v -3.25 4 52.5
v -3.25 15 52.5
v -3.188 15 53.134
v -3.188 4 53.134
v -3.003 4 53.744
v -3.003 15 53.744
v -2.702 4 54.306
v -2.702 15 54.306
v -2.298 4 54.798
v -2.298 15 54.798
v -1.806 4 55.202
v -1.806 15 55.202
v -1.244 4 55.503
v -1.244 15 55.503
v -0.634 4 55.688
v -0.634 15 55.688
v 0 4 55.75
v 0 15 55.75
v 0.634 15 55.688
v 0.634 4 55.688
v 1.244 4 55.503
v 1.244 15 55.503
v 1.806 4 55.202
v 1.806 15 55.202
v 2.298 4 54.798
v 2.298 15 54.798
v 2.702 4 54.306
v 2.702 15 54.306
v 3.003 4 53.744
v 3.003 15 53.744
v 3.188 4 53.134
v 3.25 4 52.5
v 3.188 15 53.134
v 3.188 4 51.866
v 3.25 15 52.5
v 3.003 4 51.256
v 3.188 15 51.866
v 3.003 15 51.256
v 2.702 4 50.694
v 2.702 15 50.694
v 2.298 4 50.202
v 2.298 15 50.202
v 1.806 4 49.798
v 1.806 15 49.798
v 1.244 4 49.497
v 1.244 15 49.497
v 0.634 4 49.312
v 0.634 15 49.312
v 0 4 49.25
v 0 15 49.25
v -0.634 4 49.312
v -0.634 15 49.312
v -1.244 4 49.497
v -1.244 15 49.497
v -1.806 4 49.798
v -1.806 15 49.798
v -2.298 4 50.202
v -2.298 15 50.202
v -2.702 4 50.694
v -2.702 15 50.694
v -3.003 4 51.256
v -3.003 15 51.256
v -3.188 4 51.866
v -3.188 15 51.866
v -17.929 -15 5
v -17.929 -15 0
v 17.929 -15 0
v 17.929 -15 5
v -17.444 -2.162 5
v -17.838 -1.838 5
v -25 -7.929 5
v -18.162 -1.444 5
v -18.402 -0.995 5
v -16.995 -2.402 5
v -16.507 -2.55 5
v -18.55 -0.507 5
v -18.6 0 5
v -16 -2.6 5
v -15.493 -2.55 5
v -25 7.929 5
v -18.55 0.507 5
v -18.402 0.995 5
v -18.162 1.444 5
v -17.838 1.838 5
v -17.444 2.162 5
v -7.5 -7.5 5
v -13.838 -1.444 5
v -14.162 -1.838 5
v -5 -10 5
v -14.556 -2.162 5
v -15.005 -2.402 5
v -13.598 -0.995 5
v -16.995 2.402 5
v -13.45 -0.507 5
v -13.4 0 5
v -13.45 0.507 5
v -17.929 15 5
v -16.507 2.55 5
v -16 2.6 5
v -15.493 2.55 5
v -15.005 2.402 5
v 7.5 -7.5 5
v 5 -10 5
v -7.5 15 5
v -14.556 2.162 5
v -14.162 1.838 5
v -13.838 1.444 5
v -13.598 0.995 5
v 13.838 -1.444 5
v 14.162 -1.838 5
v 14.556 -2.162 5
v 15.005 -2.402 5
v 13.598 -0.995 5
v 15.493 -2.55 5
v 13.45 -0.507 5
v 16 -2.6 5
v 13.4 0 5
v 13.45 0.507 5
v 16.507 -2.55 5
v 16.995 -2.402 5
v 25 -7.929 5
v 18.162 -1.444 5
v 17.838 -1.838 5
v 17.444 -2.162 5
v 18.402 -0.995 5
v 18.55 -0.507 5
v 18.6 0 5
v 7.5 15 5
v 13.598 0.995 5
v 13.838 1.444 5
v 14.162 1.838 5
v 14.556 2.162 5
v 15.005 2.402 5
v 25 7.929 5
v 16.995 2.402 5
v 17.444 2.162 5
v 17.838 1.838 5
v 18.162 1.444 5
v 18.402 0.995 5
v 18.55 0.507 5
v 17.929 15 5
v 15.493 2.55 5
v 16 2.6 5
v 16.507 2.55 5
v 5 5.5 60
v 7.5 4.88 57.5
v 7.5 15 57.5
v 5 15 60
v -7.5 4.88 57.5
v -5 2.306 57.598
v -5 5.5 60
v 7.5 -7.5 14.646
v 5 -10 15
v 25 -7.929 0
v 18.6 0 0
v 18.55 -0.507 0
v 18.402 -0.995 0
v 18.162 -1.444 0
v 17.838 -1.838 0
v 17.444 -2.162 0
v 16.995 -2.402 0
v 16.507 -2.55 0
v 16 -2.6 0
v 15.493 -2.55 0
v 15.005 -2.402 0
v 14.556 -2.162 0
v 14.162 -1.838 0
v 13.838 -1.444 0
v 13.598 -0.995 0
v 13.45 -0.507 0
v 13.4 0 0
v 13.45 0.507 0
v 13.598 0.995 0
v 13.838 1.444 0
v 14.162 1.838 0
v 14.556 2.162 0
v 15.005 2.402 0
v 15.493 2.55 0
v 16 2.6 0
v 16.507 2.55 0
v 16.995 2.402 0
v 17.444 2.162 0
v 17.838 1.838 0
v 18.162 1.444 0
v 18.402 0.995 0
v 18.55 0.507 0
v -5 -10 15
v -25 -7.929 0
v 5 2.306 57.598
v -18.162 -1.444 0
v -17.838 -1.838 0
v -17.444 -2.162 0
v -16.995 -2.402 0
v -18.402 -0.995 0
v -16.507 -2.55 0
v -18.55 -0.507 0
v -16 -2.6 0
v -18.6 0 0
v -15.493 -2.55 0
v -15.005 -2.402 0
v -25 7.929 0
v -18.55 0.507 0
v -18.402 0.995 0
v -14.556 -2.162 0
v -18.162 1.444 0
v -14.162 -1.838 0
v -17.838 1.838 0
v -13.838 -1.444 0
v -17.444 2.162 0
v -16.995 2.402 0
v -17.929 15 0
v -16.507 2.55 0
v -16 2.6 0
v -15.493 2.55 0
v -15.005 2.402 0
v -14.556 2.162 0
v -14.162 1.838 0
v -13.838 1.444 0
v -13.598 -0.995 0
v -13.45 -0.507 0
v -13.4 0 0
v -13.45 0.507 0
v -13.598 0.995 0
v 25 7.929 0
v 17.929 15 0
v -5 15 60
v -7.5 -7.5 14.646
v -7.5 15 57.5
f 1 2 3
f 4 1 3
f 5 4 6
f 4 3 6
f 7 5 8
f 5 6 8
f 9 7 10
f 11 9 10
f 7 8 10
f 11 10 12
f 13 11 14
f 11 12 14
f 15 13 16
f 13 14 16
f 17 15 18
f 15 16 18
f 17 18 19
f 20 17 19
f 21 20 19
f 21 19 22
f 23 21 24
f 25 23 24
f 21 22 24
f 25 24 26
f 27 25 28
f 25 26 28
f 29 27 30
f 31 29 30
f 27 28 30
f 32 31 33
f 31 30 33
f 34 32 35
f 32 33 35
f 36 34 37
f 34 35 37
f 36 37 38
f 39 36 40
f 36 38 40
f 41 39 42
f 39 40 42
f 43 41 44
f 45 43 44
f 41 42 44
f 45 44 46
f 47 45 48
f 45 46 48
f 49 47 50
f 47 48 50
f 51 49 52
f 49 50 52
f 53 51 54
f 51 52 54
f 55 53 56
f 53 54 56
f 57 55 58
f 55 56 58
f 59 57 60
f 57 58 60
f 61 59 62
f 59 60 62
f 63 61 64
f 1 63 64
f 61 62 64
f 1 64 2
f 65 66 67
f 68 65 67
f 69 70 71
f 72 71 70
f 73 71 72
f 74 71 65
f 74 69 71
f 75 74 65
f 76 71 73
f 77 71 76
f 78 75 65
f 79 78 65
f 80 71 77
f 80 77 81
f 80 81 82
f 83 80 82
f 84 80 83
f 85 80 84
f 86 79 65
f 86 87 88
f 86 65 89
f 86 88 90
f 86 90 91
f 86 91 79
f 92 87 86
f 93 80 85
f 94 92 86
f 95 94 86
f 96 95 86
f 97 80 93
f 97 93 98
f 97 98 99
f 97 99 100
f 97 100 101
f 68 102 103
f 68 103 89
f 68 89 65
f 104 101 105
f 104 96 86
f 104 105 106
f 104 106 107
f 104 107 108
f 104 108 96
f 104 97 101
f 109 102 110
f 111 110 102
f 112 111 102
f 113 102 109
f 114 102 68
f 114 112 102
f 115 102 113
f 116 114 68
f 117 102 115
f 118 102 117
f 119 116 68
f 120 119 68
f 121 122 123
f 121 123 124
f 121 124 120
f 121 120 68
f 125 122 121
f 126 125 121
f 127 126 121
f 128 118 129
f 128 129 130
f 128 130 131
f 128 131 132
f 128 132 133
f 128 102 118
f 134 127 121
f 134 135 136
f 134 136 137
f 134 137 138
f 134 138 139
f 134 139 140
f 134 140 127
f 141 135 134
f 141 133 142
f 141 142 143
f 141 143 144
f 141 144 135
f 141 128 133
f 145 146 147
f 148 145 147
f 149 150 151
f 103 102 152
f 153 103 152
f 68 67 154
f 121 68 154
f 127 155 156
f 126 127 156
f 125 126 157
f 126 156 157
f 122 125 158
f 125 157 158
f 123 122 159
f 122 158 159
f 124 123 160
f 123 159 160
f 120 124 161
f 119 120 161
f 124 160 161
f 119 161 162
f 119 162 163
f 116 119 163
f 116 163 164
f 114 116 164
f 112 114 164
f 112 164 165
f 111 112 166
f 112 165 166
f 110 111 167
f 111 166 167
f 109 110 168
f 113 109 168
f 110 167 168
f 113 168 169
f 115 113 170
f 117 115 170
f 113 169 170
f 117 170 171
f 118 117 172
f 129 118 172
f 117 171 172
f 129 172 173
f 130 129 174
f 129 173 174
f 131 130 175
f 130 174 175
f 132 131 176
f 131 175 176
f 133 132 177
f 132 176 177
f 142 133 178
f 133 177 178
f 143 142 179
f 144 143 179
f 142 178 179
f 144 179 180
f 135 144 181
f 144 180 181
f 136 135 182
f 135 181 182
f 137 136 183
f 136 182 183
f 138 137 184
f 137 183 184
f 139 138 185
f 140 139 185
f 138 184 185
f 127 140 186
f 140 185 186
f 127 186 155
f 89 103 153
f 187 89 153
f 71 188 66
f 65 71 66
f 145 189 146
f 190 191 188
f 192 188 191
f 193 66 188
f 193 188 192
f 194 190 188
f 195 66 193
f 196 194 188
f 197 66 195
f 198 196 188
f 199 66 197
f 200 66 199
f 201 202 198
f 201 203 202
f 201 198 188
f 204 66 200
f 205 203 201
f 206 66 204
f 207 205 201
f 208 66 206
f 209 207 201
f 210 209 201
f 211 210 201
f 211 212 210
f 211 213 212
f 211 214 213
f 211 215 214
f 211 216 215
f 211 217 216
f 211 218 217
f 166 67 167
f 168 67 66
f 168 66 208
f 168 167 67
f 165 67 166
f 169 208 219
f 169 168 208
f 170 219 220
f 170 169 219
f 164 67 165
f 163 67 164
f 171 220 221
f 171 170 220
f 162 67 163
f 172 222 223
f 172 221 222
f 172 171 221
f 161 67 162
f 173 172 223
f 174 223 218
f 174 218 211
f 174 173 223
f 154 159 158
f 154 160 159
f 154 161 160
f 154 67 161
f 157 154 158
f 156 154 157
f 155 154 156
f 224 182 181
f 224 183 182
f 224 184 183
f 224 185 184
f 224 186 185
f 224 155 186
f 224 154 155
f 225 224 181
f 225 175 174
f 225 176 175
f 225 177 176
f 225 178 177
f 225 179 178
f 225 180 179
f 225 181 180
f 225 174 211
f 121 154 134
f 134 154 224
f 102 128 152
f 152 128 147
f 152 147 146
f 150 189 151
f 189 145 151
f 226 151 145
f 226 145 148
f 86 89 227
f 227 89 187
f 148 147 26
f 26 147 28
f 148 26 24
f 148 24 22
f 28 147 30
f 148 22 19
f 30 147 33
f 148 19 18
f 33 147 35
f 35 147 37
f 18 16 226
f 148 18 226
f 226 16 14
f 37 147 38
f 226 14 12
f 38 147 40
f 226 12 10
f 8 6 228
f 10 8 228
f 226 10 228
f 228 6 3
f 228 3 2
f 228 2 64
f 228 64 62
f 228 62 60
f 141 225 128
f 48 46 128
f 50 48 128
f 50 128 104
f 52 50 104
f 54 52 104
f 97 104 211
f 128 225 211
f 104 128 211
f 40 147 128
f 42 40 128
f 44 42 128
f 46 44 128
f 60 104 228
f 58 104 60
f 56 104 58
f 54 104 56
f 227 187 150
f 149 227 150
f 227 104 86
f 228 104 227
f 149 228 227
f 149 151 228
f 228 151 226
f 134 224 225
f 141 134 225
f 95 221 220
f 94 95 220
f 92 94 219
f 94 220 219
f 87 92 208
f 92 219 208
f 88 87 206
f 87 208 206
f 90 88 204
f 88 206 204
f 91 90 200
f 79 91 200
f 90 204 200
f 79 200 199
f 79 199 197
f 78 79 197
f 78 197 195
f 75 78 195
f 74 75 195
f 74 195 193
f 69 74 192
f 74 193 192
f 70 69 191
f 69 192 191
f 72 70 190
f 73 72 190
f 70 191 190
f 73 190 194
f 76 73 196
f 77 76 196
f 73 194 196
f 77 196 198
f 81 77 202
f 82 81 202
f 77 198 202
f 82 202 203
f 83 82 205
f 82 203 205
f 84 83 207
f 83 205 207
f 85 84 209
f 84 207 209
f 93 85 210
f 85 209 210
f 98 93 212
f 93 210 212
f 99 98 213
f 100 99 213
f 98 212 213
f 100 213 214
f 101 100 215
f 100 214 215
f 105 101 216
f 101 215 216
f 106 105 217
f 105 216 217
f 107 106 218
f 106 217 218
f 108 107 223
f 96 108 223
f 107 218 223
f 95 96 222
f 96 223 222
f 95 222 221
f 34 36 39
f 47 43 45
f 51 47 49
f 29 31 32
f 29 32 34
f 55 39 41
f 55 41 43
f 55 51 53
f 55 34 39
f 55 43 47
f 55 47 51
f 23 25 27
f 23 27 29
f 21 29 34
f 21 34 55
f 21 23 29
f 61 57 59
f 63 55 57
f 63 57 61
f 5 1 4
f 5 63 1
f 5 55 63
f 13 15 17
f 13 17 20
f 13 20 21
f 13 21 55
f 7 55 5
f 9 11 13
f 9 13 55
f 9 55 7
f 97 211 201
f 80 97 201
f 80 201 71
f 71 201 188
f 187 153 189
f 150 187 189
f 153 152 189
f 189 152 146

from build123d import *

# Parameters (mm, degrees)
PAD_DEPTH       = 5
PAD001_DEPTH    = 7.5
CHAMFER_SIZE    = 2.5
SKETCH002_R     = 3.25
POCKET_DEPTH    = 11
SKETCH003_R     = 2.6
POCKET001_DEPTH = 5


with BuildPart() as part:
    # Sketch → Pad (new body)
    with BuildSketch(Plane.XY):
        Polygon((-17.928932, -15), (17.928932, -15), (25, -7.928932), (25, 7.928932), (17.928932, 15), (-17.928932, 15), (-25, 7.928932), (-25, -7.928932), align=None)
    extrude(amount=PAD_DEPTH)

    # Sketch001 → Pad001 (join, symmetric)
    with BuildSketch(Plane.YZ):
        Polygon((0, 0), (-10, 0), (-10, 15), (3, 60), (15, 60), (15, 0), align=None)
    extrude(amount=PAD001_DEPTH, both=True)

    # Chamfer
    chamfer_edges = [part.edges().sort_by_distance(p)[0] for p in [
        (0, 3, 60),
        (7.5, -3.5, 37.5),
        (-7.5, -3.5, 37.5),
        (-7.5, -10, 10),
        (7.5, -10, 10),
        (7.5, 9, 60),
        (-7.5, 9, 60),
    ]]
    chamfer(chamfer_edges, length=CHAMFER_SIZE)

    # Sketch002 (on Face4 of Chamfer) → Pocket (cut)
    with BuildSketch(Plane(origin=(0, 15, 0), x_dir=(-1, 0, 0), z_dir=(0, 1, 0))):
        with Locations((0, 52.5)):
            Circle(SKETCH002_R)
    extrude(amount=-POCKET_DEPTH, mode=Mode.SUBTRACT)

    # Sketch003 (on Face19 of Pocket) → Pocket001 (cut)
    with BuildSketch(Plane(origin=(0, 0, 0), x_dir=(1, 0, 0), z_dir=(0, 0, -1))):
        with Locations((-16, 0)):
            Circle(SKETCH003_R)
        with Locations((16, 0)):
            Circle(SKETCH003_R)
    extrude(amount=-POCKET001_DEPTH, mode=Mode.SUBTRACT)


solid = part.part
